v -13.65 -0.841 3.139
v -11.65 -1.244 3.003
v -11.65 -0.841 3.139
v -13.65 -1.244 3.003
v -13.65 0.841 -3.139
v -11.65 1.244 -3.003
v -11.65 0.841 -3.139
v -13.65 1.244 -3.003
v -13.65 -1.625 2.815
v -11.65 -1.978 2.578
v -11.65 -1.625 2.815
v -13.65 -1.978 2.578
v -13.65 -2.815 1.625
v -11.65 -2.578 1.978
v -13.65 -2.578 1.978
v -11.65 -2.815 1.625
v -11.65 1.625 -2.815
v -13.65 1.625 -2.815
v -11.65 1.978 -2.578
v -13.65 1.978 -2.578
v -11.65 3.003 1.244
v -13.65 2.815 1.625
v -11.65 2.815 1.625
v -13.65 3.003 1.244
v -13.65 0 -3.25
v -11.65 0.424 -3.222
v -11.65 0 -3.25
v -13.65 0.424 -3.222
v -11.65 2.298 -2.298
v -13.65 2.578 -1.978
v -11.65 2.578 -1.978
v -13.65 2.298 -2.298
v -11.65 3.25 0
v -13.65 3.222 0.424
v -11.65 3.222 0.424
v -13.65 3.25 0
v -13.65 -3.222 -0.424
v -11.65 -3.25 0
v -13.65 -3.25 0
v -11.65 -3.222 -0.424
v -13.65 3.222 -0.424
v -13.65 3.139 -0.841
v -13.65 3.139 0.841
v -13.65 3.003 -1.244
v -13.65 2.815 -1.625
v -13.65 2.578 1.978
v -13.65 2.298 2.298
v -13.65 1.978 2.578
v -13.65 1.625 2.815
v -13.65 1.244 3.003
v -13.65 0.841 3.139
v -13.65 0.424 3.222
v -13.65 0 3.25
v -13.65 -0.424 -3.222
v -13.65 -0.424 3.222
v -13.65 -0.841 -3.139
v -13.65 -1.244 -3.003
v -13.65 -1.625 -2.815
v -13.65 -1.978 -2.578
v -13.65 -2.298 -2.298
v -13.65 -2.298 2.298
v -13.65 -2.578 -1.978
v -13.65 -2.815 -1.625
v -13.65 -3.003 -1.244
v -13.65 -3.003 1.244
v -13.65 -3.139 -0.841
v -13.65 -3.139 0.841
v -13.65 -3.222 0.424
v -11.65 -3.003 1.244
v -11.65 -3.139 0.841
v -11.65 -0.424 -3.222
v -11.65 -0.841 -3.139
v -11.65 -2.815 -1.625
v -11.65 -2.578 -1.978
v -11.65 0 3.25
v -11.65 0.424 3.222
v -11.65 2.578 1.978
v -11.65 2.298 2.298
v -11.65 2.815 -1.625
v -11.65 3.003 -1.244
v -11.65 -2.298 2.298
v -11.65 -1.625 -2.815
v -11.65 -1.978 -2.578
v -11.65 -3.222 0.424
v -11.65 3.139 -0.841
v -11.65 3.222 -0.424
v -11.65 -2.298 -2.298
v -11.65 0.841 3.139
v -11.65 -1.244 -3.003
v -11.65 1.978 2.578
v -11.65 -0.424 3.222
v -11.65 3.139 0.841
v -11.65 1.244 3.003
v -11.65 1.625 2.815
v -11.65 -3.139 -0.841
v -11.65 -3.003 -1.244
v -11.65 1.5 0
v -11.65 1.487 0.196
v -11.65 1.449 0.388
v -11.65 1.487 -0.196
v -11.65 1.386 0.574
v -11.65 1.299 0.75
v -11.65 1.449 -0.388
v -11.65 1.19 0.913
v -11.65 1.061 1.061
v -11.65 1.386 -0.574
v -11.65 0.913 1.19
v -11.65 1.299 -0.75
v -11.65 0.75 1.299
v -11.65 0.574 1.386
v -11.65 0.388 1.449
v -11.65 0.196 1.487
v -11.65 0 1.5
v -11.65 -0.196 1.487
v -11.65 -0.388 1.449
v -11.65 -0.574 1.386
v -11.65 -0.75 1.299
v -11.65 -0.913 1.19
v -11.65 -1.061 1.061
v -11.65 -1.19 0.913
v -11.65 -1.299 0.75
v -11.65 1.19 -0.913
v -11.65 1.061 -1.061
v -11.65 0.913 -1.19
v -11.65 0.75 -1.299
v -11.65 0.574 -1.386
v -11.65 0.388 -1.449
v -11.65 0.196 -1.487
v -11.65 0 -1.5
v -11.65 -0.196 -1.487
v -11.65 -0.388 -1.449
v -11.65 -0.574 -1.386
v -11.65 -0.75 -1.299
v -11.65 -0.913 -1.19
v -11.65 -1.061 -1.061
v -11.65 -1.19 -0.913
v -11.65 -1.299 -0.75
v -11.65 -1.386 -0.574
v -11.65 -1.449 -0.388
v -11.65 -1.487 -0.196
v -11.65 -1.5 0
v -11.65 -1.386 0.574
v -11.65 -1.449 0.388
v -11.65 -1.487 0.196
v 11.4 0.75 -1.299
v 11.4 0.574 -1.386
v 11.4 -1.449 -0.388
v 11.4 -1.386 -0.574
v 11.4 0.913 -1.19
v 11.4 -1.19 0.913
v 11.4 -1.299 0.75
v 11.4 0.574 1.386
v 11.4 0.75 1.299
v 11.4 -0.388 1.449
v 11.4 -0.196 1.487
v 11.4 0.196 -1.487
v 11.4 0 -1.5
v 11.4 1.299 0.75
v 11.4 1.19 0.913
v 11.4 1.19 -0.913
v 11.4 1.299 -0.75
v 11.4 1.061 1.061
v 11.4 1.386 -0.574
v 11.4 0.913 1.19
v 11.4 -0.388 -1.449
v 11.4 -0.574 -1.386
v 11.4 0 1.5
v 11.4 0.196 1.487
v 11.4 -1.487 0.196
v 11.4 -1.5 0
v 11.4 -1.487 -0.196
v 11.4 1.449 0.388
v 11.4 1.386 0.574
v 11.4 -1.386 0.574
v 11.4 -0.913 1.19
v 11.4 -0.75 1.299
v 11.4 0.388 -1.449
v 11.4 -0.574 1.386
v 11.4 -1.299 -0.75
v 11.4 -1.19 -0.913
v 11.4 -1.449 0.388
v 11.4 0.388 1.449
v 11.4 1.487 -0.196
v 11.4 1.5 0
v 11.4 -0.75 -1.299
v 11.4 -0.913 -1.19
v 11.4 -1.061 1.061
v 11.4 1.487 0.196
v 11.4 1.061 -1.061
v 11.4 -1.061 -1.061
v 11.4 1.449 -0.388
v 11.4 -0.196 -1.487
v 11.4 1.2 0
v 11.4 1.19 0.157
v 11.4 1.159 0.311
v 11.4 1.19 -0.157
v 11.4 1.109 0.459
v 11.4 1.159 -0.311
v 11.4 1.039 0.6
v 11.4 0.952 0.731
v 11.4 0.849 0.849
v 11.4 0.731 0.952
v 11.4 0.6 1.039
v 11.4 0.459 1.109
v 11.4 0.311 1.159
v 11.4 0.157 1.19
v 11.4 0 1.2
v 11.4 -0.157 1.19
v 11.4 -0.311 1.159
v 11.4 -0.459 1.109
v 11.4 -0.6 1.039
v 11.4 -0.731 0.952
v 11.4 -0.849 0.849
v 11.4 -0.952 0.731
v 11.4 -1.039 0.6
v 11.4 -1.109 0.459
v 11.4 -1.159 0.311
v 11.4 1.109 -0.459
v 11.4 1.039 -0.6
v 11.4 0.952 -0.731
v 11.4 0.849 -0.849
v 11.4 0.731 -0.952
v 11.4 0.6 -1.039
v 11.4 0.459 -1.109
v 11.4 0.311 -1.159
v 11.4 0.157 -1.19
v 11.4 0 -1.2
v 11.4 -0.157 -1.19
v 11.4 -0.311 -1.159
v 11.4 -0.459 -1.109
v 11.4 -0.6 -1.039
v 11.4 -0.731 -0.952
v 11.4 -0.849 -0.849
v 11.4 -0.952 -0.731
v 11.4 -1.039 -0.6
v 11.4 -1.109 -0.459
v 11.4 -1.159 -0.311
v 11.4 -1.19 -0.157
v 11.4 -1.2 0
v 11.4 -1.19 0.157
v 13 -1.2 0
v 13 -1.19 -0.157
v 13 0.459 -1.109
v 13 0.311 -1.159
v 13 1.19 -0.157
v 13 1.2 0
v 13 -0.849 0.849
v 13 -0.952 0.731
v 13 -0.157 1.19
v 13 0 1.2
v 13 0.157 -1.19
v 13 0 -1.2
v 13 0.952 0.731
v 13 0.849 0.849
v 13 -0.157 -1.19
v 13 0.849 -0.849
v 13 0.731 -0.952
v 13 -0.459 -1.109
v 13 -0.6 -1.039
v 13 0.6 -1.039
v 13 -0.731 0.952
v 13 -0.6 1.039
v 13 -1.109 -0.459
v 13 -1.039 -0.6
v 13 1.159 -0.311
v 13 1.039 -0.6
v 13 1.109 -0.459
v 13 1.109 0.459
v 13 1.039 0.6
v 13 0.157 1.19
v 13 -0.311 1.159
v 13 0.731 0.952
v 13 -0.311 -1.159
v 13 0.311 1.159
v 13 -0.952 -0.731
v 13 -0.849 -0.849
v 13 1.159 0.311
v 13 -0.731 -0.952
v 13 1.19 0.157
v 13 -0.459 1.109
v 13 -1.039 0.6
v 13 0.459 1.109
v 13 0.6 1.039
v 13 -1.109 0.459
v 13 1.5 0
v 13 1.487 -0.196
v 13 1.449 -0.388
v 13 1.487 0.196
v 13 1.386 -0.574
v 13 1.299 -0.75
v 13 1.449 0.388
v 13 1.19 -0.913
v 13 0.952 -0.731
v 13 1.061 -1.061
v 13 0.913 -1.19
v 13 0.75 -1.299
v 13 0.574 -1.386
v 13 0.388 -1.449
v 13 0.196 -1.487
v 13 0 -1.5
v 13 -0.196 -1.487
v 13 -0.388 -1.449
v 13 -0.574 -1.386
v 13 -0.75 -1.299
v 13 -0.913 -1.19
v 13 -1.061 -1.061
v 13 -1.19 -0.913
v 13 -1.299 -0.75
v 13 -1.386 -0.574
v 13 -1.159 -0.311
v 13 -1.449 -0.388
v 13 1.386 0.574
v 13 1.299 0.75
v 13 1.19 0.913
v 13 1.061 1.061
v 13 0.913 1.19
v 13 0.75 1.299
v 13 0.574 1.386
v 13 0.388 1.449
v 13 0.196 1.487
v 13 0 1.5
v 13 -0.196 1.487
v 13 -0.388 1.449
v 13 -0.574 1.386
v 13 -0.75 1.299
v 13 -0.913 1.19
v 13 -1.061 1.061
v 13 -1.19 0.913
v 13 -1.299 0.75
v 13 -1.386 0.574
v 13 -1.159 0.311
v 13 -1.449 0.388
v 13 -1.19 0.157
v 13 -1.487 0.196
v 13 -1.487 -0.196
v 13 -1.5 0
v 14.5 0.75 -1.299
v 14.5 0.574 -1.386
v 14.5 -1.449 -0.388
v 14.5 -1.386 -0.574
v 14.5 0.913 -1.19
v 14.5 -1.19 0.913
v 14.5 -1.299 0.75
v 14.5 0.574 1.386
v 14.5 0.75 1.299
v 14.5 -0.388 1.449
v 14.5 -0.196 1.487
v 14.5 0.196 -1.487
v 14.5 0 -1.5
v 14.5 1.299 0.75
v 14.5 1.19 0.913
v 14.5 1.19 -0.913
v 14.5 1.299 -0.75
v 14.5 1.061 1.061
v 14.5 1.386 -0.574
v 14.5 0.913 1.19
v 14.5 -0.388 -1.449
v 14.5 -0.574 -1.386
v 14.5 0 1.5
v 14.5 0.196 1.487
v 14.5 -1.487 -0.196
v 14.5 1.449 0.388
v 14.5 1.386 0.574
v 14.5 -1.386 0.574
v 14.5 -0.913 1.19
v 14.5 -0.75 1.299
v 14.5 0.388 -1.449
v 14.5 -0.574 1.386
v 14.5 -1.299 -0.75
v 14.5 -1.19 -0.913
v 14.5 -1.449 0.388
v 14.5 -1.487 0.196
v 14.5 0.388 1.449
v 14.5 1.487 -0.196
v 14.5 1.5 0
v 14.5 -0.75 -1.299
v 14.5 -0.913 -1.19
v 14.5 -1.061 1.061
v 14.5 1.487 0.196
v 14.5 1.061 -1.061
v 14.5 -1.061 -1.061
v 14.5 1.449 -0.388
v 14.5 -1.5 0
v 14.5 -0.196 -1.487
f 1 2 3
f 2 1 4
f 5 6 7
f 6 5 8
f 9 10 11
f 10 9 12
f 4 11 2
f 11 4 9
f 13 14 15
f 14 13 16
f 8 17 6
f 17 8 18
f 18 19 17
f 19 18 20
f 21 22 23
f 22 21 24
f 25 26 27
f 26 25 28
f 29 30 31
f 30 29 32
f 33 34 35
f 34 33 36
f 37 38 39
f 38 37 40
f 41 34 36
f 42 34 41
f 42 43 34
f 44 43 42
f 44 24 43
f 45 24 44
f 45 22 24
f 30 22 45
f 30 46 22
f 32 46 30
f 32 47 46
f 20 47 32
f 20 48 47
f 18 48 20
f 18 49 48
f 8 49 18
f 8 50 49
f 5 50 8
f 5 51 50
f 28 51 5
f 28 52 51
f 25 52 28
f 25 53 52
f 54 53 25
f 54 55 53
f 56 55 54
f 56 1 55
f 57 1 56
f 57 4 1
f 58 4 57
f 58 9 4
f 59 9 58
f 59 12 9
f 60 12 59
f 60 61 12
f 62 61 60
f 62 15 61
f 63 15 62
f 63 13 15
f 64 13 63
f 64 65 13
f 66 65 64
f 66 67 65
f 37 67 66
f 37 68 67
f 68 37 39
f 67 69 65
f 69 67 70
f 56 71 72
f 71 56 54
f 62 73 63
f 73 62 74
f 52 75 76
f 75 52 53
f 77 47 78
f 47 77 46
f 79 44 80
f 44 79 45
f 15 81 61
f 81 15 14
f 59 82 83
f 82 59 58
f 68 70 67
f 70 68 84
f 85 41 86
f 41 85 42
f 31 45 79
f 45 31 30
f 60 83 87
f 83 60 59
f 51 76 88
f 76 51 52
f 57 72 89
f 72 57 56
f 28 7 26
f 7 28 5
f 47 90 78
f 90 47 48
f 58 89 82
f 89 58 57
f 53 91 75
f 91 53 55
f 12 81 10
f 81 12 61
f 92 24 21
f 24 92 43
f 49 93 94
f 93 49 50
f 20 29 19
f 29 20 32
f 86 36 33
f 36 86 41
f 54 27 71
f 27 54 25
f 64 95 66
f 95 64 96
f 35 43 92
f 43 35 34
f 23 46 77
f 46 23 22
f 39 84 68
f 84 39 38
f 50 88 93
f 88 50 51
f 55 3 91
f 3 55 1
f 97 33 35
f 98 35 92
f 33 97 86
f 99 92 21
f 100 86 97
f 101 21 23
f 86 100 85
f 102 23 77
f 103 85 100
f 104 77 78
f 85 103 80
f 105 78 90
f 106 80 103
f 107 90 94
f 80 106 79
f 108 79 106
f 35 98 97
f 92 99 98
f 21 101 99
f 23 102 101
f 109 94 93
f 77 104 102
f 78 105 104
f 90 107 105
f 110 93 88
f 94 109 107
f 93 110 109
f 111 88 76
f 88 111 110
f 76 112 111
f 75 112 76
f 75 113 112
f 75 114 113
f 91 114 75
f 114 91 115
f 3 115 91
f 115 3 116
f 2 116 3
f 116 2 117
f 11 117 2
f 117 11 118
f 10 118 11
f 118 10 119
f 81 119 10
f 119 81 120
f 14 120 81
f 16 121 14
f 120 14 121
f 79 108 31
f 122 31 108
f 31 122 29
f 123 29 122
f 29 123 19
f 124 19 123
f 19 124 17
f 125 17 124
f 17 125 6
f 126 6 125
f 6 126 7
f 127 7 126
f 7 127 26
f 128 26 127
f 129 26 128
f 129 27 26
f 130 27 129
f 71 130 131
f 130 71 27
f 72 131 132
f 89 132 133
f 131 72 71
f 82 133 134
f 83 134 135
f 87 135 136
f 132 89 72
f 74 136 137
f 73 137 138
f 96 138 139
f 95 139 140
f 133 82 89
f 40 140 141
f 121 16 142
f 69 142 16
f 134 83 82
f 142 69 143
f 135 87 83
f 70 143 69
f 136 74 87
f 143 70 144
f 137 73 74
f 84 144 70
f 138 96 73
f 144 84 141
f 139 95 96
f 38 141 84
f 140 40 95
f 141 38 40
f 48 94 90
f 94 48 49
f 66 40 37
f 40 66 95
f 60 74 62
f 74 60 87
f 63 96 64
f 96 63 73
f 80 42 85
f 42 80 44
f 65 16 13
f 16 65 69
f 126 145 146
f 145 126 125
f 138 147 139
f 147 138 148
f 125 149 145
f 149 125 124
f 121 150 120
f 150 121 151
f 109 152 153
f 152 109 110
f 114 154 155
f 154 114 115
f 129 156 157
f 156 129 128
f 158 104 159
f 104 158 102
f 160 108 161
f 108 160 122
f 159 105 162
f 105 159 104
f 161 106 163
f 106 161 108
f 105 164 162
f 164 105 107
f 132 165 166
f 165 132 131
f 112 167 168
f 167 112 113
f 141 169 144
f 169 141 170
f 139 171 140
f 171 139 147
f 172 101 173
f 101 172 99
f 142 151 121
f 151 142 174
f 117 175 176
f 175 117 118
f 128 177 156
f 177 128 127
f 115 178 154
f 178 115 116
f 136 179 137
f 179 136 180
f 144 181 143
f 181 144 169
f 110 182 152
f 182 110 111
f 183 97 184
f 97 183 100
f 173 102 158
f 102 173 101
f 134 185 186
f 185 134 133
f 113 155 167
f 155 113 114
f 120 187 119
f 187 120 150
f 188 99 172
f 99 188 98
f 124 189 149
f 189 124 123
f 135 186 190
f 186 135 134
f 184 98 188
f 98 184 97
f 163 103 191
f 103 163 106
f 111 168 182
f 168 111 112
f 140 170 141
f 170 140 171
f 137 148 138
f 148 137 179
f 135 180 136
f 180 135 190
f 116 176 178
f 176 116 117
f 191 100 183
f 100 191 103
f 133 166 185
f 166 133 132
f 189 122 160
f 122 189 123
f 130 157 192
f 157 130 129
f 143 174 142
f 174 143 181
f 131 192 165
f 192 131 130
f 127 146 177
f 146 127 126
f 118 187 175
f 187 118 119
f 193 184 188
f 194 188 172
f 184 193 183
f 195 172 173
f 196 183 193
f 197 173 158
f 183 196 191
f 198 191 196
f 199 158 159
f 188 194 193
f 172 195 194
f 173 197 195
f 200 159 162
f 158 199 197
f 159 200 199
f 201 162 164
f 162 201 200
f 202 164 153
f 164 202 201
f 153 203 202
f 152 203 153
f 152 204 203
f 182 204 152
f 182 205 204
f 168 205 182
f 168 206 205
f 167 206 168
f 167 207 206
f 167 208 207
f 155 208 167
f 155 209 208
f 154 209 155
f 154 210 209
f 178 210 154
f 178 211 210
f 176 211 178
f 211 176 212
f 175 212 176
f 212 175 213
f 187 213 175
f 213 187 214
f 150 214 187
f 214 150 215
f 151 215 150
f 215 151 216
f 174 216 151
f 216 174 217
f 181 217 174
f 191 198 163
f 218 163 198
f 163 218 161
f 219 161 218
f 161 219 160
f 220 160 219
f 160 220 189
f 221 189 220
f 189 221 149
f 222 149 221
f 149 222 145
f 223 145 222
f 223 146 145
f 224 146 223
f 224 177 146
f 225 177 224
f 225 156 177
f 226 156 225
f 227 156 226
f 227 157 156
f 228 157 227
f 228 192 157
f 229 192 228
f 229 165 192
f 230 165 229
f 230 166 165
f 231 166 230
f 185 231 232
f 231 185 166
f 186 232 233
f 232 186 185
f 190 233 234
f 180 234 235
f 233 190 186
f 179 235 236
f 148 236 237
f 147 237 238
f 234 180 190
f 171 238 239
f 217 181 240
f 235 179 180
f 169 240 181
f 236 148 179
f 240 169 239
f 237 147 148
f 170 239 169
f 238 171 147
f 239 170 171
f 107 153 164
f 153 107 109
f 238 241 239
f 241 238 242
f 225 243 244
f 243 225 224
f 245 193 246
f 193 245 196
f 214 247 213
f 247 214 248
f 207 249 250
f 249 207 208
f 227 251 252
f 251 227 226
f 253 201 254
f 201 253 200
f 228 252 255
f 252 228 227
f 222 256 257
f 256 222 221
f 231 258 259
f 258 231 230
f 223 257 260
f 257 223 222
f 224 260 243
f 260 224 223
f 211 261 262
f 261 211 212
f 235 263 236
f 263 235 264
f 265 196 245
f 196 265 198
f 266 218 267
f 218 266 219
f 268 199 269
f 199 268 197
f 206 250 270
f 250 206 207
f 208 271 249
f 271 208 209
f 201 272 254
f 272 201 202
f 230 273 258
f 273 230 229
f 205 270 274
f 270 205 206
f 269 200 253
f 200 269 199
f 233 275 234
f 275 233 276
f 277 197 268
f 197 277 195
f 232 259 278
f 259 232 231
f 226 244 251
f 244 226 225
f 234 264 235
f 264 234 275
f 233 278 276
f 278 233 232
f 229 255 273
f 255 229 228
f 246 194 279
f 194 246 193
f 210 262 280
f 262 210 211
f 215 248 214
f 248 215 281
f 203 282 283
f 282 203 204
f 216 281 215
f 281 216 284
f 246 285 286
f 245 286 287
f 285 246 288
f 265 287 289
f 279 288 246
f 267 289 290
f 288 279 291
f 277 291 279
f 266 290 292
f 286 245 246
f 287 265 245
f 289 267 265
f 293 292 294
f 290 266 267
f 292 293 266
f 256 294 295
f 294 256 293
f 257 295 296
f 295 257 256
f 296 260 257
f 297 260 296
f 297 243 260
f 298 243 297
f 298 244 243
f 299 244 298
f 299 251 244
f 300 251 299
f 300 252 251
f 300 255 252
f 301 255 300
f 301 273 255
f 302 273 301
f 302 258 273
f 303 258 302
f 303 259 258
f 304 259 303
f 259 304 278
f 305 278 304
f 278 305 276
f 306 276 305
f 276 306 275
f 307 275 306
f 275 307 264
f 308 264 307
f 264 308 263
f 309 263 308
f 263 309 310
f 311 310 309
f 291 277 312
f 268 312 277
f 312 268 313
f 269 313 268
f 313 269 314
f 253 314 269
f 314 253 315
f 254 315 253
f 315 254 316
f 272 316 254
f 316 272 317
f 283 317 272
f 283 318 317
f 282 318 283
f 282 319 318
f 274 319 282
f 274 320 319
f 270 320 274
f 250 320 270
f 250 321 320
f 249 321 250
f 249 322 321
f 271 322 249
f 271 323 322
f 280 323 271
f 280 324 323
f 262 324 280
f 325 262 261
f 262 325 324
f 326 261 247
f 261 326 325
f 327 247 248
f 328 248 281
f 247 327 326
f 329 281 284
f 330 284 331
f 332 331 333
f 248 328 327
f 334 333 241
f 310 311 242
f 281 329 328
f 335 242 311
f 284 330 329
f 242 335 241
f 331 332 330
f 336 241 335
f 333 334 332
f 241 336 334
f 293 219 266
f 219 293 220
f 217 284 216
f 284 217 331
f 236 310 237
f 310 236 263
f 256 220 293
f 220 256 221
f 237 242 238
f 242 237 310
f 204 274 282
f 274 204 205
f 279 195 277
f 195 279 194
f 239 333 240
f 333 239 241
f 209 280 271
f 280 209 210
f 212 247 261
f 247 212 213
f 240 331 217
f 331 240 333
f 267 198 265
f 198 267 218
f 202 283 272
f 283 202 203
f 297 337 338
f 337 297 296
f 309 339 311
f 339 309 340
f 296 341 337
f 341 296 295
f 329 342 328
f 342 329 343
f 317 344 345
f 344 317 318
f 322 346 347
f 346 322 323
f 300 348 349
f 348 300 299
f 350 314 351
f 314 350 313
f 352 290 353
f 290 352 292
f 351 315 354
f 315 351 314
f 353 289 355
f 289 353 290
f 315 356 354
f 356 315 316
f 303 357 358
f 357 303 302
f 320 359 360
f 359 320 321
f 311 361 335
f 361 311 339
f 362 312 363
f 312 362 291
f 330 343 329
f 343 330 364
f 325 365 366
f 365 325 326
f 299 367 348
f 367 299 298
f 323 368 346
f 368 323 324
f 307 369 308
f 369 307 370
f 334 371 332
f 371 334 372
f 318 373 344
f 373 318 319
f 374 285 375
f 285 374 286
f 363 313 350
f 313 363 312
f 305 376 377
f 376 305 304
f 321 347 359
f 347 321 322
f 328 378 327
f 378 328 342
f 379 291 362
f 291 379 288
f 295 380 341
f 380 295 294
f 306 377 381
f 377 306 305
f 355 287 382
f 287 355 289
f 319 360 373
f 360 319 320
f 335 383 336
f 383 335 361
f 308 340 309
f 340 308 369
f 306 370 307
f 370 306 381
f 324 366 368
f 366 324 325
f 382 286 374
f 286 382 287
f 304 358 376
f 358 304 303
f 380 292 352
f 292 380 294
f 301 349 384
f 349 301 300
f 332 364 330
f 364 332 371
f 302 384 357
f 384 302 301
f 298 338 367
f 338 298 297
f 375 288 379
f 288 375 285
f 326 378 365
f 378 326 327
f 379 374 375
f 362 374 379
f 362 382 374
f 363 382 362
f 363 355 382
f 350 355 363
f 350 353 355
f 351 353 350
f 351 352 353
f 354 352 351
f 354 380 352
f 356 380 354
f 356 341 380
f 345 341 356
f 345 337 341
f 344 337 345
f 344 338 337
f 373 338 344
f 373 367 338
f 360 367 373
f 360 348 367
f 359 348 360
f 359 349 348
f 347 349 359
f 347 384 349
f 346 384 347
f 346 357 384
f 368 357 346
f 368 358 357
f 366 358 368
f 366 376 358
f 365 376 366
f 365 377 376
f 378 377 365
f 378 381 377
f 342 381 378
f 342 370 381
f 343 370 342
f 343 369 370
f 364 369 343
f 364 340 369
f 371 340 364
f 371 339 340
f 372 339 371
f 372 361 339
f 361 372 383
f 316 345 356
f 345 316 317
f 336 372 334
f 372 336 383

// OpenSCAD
$fn=48;

module cyl_x(d,l,x0) {
    translate([x0,0,0]) rotate([0,90,0]) cylinder(d=d,h=l);
}

// Frozen BASE service geometry:
// head pocket X=-14.35..-11.65
// clip pocket X=+11.20..+13.20
// service path X=-14.35..+15.05
//
// Corrected candidate:
// head  -13.65..-11.65  Ø6.50
// shaft -11.65..+11.40  Ø3.00
// groove +11.40..+13.00 Ø2.40
// tip    +13.00..+14.50 Ø3.00
// total length = 28.15 mm

union() {
    cyl_x(6.50,2.00,-13.65);
    cyl_x(3.00,23.05,-11.65);
    cyl_x(2.40,1.60,11.40);
    cyl_x(3.00,1.50,13.00);
}
